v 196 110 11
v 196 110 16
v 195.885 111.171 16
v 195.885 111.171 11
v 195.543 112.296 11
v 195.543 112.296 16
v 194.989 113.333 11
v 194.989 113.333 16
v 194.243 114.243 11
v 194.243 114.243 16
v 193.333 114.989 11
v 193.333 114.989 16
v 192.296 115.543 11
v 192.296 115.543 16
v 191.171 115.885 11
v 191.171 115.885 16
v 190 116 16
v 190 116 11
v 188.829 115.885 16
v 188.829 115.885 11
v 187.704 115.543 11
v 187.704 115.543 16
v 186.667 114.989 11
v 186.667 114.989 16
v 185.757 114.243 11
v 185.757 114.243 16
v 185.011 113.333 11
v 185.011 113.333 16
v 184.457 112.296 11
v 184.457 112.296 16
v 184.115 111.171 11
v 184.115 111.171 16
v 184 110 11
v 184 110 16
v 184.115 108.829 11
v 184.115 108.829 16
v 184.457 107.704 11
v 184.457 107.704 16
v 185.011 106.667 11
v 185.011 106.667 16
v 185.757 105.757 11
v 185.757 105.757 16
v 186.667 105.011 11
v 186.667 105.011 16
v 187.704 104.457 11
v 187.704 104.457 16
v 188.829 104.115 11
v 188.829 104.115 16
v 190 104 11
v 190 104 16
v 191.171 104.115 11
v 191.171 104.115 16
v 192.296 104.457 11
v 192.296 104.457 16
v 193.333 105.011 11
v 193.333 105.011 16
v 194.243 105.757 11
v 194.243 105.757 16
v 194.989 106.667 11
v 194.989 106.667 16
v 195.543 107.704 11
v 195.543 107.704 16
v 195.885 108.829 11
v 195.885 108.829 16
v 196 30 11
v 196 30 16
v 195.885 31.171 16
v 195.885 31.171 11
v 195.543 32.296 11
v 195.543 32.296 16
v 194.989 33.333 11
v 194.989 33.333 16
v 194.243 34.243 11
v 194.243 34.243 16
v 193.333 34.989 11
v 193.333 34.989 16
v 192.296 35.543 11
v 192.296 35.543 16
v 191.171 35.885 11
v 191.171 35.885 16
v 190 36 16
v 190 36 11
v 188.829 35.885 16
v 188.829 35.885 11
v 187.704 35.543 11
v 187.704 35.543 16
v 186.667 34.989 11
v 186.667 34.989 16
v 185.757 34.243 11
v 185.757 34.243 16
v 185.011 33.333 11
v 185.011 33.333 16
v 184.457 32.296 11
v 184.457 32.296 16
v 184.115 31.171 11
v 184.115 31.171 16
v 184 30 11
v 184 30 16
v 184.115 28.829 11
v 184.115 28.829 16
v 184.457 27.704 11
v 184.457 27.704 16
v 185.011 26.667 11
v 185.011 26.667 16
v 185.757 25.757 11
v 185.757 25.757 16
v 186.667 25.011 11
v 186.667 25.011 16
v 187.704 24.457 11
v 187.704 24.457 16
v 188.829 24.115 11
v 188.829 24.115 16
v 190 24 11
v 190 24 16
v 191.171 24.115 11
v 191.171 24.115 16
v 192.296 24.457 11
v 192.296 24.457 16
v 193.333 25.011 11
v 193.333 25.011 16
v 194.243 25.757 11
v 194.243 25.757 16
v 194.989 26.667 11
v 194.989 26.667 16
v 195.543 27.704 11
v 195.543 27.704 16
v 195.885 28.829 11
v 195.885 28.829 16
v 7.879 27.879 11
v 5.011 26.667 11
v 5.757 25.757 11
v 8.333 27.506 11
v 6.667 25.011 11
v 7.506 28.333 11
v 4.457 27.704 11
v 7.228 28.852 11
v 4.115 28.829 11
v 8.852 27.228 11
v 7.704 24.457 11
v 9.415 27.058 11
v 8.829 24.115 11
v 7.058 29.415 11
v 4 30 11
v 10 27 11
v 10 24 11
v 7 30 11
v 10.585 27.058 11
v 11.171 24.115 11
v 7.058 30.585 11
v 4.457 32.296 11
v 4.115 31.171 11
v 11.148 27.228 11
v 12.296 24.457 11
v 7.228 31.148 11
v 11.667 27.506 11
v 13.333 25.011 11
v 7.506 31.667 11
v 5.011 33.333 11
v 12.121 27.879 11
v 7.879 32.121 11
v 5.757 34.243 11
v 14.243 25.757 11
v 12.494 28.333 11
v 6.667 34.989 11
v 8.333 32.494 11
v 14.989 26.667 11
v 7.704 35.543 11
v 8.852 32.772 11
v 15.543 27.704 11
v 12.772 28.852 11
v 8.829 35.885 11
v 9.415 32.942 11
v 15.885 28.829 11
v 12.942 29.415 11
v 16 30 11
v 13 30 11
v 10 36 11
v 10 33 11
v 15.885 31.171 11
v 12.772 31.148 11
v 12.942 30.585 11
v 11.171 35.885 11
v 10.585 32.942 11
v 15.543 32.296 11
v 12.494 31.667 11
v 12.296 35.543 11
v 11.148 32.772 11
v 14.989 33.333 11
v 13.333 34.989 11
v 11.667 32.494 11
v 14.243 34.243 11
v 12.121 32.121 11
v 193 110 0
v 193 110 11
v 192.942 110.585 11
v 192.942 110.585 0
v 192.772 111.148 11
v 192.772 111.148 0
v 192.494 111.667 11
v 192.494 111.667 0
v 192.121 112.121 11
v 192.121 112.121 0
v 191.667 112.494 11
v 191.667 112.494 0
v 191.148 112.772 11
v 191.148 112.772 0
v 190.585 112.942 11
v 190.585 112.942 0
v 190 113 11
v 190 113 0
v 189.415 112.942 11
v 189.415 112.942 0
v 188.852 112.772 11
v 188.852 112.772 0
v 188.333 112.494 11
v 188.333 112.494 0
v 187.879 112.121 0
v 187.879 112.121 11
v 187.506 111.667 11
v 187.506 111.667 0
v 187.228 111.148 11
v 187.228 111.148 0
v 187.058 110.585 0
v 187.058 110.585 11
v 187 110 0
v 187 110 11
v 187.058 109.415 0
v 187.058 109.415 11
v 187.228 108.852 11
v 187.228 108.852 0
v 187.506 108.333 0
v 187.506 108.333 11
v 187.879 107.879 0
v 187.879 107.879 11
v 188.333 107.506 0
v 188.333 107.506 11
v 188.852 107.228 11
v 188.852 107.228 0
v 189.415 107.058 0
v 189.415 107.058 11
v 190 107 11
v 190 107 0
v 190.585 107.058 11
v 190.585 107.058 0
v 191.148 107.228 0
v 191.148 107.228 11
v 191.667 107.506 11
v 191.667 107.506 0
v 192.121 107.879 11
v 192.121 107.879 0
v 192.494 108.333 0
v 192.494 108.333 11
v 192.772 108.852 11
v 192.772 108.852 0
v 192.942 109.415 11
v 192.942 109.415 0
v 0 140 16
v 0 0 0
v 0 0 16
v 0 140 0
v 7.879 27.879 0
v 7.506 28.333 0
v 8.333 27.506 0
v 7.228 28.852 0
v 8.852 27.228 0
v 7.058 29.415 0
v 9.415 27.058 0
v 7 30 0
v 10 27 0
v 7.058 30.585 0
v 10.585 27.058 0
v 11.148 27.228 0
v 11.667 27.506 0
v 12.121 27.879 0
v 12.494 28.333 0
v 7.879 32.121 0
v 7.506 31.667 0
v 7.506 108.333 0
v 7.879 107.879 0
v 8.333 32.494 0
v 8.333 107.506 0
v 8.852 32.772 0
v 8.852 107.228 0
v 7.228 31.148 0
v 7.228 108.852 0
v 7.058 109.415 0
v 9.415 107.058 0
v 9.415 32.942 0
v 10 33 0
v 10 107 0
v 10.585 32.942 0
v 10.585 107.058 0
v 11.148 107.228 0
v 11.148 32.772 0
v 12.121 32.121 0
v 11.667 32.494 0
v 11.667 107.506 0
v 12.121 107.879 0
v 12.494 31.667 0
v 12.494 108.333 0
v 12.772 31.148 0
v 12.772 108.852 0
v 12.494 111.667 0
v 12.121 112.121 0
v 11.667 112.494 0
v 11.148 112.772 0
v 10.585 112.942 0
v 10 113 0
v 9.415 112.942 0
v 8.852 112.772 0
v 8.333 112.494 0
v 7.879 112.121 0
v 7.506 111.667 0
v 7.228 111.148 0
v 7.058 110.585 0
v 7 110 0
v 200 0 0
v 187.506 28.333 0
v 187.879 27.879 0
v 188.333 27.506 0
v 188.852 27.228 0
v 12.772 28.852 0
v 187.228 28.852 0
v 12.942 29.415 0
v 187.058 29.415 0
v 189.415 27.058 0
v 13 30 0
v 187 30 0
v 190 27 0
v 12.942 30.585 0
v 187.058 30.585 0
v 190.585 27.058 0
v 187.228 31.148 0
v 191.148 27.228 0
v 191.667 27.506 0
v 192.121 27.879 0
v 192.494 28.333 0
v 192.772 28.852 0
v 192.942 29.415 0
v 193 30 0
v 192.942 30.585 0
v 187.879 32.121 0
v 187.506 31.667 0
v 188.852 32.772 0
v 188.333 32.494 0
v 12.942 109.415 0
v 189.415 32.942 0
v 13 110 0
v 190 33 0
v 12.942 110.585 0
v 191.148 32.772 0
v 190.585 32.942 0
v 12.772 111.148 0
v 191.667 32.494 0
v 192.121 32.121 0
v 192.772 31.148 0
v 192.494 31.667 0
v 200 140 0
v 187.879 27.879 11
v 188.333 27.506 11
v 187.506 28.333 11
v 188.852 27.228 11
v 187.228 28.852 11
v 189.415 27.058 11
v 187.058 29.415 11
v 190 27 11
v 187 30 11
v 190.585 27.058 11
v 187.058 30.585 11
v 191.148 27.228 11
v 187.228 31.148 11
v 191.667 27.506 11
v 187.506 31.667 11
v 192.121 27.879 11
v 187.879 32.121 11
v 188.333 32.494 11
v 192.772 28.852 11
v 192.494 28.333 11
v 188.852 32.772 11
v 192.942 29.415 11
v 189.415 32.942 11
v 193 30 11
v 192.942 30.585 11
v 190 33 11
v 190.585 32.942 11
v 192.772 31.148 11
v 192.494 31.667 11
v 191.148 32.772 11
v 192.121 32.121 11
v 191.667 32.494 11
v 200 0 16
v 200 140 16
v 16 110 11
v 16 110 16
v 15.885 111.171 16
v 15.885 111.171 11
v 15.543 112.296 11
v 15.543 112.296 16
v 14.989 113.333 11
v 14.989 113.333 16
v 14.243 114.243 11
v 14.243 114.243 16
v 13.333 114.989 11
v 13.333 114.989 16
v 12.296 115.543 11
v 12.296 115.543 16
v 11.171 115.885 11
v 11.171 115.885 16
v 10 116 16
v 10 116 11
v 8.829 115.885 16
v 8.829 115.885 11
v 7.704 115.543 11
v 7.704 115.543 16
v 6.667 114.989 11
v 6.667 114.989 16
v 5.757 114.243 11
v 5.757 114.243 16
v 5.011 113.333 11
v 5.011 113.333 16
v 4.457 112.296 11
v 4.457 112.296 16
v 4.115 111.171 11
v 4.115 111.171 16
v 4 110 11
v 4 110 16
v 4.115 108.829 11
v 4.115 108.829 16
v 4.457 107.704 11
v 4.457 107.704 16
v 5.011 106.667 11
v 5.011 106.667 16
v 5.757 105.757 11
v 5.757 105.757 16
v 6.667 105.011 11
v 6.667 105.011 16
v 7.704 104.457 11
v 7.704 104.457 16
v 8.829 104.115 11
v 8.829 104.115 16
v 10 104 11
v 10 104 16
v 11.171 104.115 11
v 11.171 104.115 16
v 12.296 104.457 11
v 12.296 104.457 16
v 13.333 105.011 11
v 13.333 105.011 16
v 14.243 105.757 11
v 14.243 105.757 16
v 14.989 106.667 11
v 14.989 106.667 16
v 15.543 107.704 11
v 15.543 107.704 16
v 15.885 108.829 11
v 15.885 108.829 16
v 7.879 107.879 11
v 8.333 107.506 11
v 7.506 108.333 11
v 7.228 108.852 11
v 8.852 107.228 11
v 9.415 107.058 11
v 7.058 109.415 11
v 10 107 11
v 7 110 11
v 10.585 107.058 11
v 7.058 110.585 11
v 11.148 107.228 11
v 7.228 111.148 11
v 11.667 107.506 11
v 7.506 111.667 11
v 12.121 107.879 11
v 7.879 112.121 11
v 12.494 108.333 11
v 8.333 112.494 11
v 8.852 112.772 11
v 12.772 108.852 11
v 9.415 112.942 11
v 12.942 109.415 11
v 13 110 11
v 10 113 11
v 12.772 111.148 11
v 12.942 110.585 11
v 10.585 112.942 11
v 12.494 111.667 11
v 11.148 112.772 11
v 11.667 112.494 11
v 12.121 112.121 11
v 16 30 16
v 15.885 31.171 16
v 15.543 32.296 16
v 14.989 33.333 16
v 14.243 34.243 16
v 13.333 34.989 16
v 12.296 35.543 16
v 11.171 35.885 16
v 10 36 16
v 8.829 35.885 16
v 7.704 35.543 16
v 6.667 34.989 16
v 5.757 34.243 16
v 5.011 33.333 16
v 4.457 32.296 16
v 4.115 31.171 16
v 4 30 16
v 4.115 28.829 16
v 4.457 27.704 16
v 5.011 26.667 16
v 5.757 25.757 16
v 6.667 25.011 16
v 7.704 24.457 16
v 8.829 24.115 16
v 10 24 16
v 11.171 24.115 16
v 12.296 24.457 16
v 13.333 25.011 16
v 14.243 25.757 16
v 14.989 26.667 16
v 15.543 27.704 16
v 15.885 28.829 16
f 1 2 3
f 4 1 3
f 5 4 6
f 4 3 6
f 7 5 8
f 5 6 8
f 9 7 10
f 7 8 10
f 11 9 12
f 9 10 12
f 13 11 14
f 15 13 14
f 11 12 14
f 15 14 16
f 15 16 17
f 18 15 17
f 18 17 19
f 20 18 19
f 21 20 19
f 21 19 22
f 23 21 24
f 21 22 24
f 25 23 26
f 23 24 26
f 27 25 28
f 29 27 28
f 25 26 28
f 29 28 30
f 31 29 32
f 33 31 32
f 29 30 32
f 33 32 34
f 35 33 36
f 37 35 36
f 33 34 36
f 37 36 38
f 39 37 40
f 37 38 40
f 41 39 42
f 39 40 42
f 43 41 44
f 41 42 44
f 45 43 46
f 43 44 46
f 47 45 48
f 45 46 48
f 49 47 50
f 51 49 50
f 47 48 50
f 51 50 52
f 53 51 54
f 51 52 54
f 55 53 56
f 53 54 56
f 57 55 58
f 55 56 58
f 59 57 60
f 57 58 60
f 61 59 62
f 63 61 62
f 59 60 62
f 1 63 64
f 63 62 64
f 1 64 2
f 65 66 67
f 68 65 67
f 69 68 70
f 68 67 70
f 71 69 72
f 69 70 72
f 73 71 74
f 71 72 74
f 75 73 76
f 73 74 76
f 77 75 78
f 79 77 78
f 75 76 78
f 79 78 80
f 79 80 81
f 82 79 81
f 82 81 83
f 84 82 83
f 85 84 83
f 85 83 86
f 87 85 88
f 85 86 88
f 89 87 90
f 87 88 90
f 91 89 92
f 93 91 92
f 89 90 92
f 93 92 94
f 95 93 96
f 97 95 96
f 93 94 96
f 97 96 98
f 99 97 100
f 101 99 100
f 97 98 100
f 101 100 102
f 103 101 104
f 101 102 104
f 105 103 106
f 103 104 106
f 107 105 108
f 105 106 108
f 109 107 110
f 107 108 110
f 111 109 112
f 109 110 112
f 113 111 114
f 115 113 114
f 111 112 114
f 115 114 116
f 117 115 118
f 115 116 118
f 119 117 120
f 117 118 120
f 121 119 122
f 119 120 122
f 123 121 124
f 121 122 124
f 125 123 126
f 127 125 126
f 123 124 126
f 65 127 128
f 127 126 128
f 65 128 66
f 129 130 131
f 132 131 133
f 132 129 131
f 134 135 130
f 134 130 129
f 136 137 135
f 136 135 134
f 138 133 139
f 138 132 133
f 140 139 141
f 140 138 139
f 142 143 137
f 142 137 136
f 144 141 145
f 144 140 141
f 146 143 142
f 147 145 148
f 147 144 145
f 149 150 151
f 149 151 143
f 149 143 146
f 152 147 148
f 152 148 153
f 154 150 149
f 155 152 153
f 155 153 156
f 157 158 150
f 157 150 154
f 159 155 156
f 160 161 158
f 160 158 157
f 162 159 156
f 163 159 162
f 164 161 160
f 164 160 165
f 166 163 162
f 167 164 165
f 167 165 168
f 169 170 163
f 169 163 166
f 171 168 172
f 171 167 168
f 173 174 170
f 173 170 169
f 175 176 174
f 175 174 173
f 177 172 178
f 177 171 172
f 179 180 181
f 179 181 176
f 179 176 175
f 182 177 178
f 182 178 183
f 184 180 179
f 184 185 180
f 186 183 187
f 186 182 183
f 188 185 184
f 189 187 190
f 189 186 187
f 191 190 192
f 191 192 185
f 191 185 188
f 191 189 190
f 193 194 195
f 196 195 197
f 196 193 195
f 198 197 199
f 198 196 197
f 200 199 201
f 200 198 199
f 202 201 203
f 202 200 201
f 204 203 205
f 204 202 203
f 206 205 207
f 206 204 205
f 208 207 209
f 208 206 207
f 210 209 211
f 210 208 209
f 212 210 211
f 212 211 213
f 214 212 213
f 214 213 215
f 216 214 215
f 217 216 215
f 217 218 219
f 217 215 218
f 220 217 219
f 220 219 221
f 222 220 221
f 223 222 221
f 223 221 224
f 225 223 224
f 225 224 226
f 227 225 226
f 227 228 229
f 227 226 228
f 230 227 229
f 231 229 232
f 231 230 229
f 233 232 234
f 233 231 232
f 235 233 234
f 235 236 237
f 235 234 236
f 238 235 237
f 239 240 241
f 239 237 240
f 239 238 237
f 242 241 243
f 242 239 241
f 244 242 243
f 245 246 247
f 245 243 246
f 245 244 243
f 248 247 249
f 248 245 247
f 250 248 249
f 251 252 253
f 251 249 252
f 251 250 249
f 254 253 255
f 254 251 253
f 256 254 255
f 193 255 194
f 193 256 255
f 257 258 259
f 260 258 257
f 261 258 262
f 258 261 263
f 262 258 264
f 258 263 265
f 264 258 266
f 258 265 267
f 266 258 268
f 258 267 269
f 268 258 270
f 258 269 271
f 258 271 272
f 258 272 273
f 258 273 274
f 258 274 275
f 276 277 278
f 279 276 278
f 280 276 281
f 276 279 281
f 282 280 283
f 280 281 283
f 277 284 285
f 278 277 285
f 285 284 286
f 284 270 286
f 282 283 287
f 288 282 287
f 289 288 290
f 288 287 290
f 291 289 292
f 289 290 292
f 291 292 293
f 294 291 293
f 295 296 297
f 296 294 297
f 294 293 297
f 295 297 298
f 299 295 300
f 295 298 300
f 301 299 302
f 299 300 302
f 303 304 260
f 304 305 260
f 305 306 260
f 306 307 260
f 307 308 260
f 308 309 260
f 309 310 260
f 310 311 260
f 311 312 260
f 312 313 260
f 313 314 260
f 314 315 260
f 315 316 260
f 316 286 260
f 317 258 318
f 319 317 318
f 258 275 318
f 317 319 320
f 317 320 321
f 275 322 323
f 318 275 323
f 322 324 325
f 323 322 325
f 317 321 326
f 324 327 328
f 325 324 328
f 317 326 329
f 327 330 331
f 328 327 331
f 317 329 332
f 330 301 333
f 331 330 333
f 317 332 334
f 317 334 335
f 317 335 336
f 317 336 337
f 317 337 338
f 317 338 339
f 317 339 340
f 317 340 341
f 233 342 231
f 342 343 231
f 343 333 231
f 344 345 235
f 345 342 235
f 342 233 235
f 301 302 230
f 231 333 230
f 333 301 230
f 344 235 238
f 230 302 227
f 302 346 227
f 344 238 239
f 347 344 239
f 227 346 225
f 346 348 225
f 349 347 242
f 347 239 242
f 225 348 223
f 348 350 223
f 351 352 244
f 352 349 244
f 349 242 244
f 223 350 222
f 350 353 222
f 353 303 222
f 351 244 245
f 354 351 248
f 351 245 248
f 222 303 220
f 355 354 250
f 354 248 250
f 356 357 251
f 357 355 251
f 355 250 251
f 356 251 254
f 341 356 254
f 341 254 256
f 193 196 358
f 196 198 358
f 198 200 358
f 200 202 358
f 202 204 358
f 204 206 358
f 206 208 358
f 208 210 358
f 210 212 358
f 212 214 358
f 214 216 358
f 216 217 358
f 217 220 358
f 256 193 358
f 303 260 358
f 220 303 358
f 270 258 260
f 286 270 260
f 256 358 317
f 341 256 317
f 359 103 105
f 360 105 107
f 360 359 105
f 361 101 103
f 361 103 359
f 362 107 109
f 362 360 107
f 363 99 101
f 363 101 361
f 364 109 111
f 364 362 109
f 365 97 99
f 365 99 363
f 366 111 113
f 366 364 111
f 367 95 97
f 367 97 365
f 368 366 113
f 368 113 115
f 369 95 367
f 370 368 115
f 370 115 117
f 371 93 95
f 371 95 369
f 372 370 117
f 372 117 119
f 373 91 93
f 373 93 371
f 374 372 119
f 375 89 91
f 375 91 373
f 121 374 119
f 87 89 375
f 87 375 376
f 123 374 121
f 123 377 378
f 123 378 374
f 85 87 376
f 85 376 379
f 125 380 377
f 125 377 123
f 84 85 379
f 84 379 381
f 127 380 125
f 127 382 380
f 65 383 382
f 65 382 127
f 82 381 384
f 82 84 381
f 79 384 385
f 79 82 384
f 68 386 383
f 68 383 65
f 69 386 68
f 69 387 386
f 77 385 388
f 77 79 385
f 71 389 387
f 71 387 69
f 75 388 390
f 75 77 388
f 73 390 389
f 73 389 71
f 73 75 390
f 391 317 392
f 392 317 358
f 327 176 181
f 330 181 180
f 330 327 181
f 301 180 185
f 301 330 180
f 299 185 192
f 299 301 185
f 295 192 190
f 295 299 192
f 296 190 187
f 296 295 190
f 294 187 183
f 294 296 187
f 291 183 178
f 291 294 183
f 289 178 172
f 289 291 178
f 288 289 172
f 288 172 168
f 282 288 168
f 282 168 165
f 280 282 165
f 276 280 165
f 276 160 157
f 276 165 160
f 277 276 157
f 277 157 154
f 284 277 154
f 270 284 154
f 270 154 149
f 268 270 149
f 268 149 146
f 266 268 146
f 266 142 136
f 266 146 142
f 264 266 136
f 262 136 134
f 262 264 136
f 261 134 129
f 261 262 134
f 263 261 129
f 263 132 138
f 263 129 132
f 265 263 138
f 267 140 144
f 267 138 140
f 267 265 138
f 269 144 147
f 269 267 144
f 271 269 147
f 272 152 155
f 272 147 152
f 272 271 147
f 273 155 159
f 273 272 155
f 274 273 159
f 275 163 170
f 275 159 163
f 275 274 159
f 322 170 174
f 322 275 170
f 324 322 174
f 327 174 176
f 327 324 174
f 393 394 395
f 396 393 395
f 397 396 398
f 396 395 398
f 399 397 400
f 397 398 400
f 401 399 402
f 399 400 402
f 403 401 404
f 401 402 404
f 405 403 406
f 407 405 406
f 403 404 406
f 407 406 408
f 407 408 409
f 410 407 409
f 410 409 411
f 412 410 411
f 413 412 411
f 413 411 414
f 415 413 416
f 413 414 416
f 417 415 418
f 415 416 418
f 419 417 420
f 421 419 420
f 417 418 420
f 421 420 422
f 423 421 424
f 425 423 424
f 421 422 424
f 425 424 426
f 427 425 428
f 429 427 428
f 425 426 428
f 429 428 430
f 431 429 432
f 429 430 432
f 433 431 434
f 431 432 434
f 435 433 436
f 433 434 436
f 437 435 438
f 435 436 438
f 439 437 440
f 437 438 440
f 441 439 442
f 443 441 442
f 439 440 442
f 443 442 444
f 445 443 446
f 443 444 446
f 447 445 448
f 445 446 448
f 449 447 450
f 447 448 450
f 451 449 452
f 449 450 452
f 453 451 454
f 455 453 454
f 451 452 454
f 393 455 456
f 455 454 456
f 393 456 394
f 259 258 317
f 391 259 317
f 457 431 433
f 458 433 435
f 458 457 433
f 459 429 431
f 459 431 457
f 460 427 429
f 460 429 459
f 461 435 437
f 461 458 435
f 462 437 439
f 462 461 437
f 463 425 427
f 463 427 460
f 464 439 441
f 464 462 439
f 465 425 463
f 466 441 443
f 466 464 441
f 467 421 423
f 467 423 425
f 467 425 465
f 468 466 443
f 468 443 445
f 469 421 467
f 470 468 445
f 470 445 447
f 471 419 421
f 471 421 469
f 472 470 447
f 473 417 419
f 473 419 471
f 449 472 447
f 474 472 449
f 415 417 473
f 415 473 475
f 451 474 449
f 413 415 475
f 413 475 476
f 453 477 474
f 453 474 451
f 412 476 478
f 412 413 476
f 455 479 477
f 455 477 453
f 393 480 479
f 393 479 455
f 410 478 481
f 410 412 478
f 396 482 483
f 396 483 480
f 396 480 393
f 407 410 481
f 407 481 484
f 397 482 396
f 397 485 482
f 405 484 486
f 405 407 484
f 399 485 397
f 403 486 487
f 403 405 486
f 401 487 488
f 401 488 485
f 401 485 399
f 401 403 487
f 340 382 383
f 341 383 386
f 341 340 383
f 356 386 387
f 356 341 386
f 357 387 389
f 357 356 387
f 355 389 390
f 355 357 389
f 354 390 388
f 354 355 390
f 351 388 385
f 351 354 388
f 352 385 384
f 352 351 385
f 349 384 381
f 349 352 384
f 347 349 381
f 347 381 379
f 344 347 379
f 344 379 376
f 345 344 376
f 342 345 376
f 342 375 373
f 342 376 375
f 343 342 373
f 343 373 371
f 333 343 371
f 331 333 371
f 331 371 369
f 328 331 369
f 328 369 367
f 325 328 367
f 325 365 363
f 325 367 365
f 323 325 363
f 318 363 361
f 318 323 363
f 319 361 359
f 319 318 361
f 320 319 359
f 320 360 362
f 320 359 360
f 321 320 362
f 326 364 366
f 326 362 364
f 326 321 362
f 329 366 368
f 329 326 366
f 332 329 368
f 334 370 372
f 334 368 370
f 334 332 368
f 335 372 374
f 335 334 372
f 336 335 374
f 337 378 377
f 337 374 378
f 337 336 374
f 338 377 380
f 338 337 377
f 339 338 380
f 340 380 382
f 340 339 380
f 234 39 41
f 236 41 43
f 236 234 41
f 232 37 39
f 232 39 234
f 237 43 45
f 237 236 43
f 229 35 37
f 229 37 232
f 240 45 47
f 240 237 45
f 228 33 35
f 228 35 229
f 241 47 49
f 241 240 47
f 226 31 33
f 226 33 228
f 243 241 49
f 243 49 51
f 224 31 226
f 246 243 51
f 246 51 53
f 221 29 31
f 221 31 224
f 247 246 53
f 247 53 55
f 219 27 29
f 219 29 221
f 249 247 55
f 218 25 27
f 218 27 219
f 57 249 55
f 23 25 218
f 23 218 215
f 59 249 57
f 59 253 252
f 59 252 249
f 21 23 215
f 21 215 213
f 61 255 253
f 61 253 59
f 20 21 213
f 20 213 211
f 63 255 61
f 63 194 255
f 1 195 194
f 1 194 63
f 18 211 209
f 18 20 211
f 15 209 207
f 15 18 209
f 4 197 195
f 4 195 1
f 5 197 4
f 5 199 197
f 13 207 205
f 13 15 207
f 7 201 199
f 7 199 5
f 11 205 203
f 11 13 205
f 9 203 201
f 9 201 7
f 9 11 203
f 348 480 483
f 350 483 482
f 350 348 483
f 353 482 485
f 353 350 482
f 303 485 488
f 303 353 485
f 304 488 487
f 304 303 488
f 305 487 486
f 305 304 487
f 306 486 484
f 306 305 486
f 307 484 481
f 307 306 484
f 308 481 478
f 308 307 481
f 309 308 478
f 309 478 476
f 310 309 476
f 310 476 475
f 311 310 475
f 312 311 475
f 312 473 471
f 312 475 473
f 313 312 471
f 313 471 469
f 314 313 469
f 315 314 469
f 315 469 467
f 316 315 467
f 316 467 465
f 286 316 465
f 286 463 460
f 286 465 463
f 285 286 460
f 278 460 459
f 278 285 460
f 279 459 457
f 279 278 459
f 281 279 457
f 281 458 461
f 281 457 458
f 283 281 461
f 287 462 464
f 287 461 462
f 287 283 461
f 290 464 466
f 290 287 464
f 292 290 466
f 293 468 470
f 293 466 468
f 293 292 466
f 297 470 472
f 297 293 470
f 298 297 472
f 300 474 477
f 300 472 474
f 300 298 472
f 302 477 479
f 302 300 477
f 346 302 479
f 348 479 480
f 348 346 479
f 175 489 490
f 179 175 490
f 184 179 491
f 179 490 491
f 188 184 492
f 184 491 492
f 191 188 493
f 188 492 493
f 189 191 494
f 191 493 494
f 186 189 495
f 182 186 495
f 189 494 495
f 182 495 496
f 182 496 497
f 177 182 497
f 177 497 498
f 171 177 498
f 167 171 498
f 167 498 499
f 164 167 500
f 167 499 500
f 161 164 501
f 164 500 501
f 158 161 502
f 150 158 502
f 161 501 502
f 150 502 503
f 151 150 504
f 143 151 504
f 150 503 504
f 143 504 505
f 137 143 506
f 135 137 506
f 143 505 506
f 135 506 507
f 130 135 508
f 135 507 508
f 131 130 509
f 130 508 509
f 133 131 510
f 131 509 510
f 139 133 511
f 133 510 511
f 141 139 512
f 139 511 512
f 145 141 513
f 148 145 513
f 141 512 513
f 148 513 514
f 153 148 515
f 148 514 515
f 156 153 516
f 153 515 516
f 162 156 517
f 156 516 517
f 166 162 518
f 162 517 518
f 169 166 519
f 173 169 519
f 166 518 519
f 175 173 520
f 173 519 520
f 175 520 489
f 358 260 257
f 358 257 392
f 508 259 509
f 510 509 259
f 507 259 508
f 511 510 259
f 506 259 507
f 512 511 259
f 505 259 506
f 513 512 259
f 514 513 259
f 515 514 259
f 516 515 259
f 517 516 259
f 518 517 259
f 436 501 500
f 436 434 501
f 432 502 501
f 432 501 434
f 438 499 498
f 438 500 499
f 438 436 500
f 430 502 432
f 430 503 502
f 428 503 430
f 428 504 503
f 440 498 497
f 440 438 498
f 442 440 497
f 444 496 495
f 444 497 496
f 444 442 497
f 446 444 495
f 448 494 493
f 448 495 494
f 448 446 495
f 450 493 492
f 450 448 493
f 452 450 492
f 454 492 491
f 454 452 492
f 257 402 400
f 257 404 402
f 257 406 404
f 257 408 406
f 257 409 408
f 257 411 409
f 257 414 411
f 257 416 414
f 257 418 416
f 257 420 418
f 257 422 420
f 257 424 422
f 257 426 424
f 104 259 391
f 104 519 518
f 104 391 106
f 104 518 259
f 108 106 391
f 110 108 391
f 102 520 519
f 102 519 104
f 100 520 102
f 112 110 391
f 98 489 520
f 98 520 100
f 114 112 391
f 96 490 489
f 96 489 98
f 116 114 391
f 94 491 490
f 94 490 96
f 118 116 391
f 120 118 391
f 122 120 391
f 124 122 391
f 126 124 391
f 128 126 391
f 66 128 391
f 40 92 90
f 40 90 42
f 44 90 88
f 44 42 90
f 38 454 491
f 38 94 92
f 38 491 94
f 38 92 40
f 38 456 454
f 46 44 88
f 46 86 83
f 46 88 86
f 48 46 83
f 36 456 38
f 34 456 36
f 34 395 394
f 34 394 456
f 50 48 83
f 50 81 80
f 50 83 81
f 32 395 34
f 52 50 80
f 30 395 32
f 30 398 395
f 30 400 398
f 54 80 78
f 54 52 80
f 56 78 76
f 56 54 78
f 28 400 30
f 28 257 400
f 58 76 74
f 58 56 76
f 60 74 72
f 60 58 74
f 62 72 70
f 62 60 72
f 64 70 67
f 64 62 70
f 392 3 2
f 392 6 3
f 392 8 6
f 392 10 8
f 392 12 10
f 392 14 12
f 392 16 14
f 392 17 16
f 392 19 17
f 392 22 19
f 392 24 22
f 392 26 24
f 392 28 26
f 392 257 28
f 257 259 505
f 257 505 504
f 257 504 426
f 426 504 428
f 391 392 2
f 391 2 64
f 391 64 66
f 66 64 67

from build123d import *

# Parameters (mm, degrees)
SKETCH_W     = 200
SKETCH_H     = 140
SKETCH_R     = 3
PAD_DEPTH    = 16
SKETCH001_R  = 6
POCKET_DEPTH = 5


with BuildPart() as part:
    # Sketch → Pad (new body)
    with BuildSketch(Plane.XY):
        with Locations((100, 70)):
            Rectangle(SKETCH_W, SKETCH_H)
        with Locations((10, 110)):
            Circle(SKETCH_R, mode=Mode.SUBTRACT)
        with Locations((10, 30)):
            Circle(SKETCH_R, mode=Mode.SUBTRACT)
        with Locations((190, 110)):
            Circle(SKETCH_R, mode=Mode.SUBTRACT)
        with Locations((190, 30)):
            Circle(SKETCH_R, mode=Mode.SUBTRACT)
    extrude(amount=PAD_DEPTH)

    # Sketch001 (on Face10 of Pad) → Pocket (cut)
    with BuildSketch(Plane.XY.offset(16)):
        with Locations((10, 110)):
            Circle(SKETCH001_R)
        with Locations((190, 110)):
            Circle(SKETCH001_R)
        with Locations((190, 30)):
            Circle(SKETCH001_R)
        with Locations((10, 30)):
            Circle(SKETCH001_R)
    extrude(amount=-POCKET_DEPTH, mode=Mode.SUBTRACT)


solid = part.part
